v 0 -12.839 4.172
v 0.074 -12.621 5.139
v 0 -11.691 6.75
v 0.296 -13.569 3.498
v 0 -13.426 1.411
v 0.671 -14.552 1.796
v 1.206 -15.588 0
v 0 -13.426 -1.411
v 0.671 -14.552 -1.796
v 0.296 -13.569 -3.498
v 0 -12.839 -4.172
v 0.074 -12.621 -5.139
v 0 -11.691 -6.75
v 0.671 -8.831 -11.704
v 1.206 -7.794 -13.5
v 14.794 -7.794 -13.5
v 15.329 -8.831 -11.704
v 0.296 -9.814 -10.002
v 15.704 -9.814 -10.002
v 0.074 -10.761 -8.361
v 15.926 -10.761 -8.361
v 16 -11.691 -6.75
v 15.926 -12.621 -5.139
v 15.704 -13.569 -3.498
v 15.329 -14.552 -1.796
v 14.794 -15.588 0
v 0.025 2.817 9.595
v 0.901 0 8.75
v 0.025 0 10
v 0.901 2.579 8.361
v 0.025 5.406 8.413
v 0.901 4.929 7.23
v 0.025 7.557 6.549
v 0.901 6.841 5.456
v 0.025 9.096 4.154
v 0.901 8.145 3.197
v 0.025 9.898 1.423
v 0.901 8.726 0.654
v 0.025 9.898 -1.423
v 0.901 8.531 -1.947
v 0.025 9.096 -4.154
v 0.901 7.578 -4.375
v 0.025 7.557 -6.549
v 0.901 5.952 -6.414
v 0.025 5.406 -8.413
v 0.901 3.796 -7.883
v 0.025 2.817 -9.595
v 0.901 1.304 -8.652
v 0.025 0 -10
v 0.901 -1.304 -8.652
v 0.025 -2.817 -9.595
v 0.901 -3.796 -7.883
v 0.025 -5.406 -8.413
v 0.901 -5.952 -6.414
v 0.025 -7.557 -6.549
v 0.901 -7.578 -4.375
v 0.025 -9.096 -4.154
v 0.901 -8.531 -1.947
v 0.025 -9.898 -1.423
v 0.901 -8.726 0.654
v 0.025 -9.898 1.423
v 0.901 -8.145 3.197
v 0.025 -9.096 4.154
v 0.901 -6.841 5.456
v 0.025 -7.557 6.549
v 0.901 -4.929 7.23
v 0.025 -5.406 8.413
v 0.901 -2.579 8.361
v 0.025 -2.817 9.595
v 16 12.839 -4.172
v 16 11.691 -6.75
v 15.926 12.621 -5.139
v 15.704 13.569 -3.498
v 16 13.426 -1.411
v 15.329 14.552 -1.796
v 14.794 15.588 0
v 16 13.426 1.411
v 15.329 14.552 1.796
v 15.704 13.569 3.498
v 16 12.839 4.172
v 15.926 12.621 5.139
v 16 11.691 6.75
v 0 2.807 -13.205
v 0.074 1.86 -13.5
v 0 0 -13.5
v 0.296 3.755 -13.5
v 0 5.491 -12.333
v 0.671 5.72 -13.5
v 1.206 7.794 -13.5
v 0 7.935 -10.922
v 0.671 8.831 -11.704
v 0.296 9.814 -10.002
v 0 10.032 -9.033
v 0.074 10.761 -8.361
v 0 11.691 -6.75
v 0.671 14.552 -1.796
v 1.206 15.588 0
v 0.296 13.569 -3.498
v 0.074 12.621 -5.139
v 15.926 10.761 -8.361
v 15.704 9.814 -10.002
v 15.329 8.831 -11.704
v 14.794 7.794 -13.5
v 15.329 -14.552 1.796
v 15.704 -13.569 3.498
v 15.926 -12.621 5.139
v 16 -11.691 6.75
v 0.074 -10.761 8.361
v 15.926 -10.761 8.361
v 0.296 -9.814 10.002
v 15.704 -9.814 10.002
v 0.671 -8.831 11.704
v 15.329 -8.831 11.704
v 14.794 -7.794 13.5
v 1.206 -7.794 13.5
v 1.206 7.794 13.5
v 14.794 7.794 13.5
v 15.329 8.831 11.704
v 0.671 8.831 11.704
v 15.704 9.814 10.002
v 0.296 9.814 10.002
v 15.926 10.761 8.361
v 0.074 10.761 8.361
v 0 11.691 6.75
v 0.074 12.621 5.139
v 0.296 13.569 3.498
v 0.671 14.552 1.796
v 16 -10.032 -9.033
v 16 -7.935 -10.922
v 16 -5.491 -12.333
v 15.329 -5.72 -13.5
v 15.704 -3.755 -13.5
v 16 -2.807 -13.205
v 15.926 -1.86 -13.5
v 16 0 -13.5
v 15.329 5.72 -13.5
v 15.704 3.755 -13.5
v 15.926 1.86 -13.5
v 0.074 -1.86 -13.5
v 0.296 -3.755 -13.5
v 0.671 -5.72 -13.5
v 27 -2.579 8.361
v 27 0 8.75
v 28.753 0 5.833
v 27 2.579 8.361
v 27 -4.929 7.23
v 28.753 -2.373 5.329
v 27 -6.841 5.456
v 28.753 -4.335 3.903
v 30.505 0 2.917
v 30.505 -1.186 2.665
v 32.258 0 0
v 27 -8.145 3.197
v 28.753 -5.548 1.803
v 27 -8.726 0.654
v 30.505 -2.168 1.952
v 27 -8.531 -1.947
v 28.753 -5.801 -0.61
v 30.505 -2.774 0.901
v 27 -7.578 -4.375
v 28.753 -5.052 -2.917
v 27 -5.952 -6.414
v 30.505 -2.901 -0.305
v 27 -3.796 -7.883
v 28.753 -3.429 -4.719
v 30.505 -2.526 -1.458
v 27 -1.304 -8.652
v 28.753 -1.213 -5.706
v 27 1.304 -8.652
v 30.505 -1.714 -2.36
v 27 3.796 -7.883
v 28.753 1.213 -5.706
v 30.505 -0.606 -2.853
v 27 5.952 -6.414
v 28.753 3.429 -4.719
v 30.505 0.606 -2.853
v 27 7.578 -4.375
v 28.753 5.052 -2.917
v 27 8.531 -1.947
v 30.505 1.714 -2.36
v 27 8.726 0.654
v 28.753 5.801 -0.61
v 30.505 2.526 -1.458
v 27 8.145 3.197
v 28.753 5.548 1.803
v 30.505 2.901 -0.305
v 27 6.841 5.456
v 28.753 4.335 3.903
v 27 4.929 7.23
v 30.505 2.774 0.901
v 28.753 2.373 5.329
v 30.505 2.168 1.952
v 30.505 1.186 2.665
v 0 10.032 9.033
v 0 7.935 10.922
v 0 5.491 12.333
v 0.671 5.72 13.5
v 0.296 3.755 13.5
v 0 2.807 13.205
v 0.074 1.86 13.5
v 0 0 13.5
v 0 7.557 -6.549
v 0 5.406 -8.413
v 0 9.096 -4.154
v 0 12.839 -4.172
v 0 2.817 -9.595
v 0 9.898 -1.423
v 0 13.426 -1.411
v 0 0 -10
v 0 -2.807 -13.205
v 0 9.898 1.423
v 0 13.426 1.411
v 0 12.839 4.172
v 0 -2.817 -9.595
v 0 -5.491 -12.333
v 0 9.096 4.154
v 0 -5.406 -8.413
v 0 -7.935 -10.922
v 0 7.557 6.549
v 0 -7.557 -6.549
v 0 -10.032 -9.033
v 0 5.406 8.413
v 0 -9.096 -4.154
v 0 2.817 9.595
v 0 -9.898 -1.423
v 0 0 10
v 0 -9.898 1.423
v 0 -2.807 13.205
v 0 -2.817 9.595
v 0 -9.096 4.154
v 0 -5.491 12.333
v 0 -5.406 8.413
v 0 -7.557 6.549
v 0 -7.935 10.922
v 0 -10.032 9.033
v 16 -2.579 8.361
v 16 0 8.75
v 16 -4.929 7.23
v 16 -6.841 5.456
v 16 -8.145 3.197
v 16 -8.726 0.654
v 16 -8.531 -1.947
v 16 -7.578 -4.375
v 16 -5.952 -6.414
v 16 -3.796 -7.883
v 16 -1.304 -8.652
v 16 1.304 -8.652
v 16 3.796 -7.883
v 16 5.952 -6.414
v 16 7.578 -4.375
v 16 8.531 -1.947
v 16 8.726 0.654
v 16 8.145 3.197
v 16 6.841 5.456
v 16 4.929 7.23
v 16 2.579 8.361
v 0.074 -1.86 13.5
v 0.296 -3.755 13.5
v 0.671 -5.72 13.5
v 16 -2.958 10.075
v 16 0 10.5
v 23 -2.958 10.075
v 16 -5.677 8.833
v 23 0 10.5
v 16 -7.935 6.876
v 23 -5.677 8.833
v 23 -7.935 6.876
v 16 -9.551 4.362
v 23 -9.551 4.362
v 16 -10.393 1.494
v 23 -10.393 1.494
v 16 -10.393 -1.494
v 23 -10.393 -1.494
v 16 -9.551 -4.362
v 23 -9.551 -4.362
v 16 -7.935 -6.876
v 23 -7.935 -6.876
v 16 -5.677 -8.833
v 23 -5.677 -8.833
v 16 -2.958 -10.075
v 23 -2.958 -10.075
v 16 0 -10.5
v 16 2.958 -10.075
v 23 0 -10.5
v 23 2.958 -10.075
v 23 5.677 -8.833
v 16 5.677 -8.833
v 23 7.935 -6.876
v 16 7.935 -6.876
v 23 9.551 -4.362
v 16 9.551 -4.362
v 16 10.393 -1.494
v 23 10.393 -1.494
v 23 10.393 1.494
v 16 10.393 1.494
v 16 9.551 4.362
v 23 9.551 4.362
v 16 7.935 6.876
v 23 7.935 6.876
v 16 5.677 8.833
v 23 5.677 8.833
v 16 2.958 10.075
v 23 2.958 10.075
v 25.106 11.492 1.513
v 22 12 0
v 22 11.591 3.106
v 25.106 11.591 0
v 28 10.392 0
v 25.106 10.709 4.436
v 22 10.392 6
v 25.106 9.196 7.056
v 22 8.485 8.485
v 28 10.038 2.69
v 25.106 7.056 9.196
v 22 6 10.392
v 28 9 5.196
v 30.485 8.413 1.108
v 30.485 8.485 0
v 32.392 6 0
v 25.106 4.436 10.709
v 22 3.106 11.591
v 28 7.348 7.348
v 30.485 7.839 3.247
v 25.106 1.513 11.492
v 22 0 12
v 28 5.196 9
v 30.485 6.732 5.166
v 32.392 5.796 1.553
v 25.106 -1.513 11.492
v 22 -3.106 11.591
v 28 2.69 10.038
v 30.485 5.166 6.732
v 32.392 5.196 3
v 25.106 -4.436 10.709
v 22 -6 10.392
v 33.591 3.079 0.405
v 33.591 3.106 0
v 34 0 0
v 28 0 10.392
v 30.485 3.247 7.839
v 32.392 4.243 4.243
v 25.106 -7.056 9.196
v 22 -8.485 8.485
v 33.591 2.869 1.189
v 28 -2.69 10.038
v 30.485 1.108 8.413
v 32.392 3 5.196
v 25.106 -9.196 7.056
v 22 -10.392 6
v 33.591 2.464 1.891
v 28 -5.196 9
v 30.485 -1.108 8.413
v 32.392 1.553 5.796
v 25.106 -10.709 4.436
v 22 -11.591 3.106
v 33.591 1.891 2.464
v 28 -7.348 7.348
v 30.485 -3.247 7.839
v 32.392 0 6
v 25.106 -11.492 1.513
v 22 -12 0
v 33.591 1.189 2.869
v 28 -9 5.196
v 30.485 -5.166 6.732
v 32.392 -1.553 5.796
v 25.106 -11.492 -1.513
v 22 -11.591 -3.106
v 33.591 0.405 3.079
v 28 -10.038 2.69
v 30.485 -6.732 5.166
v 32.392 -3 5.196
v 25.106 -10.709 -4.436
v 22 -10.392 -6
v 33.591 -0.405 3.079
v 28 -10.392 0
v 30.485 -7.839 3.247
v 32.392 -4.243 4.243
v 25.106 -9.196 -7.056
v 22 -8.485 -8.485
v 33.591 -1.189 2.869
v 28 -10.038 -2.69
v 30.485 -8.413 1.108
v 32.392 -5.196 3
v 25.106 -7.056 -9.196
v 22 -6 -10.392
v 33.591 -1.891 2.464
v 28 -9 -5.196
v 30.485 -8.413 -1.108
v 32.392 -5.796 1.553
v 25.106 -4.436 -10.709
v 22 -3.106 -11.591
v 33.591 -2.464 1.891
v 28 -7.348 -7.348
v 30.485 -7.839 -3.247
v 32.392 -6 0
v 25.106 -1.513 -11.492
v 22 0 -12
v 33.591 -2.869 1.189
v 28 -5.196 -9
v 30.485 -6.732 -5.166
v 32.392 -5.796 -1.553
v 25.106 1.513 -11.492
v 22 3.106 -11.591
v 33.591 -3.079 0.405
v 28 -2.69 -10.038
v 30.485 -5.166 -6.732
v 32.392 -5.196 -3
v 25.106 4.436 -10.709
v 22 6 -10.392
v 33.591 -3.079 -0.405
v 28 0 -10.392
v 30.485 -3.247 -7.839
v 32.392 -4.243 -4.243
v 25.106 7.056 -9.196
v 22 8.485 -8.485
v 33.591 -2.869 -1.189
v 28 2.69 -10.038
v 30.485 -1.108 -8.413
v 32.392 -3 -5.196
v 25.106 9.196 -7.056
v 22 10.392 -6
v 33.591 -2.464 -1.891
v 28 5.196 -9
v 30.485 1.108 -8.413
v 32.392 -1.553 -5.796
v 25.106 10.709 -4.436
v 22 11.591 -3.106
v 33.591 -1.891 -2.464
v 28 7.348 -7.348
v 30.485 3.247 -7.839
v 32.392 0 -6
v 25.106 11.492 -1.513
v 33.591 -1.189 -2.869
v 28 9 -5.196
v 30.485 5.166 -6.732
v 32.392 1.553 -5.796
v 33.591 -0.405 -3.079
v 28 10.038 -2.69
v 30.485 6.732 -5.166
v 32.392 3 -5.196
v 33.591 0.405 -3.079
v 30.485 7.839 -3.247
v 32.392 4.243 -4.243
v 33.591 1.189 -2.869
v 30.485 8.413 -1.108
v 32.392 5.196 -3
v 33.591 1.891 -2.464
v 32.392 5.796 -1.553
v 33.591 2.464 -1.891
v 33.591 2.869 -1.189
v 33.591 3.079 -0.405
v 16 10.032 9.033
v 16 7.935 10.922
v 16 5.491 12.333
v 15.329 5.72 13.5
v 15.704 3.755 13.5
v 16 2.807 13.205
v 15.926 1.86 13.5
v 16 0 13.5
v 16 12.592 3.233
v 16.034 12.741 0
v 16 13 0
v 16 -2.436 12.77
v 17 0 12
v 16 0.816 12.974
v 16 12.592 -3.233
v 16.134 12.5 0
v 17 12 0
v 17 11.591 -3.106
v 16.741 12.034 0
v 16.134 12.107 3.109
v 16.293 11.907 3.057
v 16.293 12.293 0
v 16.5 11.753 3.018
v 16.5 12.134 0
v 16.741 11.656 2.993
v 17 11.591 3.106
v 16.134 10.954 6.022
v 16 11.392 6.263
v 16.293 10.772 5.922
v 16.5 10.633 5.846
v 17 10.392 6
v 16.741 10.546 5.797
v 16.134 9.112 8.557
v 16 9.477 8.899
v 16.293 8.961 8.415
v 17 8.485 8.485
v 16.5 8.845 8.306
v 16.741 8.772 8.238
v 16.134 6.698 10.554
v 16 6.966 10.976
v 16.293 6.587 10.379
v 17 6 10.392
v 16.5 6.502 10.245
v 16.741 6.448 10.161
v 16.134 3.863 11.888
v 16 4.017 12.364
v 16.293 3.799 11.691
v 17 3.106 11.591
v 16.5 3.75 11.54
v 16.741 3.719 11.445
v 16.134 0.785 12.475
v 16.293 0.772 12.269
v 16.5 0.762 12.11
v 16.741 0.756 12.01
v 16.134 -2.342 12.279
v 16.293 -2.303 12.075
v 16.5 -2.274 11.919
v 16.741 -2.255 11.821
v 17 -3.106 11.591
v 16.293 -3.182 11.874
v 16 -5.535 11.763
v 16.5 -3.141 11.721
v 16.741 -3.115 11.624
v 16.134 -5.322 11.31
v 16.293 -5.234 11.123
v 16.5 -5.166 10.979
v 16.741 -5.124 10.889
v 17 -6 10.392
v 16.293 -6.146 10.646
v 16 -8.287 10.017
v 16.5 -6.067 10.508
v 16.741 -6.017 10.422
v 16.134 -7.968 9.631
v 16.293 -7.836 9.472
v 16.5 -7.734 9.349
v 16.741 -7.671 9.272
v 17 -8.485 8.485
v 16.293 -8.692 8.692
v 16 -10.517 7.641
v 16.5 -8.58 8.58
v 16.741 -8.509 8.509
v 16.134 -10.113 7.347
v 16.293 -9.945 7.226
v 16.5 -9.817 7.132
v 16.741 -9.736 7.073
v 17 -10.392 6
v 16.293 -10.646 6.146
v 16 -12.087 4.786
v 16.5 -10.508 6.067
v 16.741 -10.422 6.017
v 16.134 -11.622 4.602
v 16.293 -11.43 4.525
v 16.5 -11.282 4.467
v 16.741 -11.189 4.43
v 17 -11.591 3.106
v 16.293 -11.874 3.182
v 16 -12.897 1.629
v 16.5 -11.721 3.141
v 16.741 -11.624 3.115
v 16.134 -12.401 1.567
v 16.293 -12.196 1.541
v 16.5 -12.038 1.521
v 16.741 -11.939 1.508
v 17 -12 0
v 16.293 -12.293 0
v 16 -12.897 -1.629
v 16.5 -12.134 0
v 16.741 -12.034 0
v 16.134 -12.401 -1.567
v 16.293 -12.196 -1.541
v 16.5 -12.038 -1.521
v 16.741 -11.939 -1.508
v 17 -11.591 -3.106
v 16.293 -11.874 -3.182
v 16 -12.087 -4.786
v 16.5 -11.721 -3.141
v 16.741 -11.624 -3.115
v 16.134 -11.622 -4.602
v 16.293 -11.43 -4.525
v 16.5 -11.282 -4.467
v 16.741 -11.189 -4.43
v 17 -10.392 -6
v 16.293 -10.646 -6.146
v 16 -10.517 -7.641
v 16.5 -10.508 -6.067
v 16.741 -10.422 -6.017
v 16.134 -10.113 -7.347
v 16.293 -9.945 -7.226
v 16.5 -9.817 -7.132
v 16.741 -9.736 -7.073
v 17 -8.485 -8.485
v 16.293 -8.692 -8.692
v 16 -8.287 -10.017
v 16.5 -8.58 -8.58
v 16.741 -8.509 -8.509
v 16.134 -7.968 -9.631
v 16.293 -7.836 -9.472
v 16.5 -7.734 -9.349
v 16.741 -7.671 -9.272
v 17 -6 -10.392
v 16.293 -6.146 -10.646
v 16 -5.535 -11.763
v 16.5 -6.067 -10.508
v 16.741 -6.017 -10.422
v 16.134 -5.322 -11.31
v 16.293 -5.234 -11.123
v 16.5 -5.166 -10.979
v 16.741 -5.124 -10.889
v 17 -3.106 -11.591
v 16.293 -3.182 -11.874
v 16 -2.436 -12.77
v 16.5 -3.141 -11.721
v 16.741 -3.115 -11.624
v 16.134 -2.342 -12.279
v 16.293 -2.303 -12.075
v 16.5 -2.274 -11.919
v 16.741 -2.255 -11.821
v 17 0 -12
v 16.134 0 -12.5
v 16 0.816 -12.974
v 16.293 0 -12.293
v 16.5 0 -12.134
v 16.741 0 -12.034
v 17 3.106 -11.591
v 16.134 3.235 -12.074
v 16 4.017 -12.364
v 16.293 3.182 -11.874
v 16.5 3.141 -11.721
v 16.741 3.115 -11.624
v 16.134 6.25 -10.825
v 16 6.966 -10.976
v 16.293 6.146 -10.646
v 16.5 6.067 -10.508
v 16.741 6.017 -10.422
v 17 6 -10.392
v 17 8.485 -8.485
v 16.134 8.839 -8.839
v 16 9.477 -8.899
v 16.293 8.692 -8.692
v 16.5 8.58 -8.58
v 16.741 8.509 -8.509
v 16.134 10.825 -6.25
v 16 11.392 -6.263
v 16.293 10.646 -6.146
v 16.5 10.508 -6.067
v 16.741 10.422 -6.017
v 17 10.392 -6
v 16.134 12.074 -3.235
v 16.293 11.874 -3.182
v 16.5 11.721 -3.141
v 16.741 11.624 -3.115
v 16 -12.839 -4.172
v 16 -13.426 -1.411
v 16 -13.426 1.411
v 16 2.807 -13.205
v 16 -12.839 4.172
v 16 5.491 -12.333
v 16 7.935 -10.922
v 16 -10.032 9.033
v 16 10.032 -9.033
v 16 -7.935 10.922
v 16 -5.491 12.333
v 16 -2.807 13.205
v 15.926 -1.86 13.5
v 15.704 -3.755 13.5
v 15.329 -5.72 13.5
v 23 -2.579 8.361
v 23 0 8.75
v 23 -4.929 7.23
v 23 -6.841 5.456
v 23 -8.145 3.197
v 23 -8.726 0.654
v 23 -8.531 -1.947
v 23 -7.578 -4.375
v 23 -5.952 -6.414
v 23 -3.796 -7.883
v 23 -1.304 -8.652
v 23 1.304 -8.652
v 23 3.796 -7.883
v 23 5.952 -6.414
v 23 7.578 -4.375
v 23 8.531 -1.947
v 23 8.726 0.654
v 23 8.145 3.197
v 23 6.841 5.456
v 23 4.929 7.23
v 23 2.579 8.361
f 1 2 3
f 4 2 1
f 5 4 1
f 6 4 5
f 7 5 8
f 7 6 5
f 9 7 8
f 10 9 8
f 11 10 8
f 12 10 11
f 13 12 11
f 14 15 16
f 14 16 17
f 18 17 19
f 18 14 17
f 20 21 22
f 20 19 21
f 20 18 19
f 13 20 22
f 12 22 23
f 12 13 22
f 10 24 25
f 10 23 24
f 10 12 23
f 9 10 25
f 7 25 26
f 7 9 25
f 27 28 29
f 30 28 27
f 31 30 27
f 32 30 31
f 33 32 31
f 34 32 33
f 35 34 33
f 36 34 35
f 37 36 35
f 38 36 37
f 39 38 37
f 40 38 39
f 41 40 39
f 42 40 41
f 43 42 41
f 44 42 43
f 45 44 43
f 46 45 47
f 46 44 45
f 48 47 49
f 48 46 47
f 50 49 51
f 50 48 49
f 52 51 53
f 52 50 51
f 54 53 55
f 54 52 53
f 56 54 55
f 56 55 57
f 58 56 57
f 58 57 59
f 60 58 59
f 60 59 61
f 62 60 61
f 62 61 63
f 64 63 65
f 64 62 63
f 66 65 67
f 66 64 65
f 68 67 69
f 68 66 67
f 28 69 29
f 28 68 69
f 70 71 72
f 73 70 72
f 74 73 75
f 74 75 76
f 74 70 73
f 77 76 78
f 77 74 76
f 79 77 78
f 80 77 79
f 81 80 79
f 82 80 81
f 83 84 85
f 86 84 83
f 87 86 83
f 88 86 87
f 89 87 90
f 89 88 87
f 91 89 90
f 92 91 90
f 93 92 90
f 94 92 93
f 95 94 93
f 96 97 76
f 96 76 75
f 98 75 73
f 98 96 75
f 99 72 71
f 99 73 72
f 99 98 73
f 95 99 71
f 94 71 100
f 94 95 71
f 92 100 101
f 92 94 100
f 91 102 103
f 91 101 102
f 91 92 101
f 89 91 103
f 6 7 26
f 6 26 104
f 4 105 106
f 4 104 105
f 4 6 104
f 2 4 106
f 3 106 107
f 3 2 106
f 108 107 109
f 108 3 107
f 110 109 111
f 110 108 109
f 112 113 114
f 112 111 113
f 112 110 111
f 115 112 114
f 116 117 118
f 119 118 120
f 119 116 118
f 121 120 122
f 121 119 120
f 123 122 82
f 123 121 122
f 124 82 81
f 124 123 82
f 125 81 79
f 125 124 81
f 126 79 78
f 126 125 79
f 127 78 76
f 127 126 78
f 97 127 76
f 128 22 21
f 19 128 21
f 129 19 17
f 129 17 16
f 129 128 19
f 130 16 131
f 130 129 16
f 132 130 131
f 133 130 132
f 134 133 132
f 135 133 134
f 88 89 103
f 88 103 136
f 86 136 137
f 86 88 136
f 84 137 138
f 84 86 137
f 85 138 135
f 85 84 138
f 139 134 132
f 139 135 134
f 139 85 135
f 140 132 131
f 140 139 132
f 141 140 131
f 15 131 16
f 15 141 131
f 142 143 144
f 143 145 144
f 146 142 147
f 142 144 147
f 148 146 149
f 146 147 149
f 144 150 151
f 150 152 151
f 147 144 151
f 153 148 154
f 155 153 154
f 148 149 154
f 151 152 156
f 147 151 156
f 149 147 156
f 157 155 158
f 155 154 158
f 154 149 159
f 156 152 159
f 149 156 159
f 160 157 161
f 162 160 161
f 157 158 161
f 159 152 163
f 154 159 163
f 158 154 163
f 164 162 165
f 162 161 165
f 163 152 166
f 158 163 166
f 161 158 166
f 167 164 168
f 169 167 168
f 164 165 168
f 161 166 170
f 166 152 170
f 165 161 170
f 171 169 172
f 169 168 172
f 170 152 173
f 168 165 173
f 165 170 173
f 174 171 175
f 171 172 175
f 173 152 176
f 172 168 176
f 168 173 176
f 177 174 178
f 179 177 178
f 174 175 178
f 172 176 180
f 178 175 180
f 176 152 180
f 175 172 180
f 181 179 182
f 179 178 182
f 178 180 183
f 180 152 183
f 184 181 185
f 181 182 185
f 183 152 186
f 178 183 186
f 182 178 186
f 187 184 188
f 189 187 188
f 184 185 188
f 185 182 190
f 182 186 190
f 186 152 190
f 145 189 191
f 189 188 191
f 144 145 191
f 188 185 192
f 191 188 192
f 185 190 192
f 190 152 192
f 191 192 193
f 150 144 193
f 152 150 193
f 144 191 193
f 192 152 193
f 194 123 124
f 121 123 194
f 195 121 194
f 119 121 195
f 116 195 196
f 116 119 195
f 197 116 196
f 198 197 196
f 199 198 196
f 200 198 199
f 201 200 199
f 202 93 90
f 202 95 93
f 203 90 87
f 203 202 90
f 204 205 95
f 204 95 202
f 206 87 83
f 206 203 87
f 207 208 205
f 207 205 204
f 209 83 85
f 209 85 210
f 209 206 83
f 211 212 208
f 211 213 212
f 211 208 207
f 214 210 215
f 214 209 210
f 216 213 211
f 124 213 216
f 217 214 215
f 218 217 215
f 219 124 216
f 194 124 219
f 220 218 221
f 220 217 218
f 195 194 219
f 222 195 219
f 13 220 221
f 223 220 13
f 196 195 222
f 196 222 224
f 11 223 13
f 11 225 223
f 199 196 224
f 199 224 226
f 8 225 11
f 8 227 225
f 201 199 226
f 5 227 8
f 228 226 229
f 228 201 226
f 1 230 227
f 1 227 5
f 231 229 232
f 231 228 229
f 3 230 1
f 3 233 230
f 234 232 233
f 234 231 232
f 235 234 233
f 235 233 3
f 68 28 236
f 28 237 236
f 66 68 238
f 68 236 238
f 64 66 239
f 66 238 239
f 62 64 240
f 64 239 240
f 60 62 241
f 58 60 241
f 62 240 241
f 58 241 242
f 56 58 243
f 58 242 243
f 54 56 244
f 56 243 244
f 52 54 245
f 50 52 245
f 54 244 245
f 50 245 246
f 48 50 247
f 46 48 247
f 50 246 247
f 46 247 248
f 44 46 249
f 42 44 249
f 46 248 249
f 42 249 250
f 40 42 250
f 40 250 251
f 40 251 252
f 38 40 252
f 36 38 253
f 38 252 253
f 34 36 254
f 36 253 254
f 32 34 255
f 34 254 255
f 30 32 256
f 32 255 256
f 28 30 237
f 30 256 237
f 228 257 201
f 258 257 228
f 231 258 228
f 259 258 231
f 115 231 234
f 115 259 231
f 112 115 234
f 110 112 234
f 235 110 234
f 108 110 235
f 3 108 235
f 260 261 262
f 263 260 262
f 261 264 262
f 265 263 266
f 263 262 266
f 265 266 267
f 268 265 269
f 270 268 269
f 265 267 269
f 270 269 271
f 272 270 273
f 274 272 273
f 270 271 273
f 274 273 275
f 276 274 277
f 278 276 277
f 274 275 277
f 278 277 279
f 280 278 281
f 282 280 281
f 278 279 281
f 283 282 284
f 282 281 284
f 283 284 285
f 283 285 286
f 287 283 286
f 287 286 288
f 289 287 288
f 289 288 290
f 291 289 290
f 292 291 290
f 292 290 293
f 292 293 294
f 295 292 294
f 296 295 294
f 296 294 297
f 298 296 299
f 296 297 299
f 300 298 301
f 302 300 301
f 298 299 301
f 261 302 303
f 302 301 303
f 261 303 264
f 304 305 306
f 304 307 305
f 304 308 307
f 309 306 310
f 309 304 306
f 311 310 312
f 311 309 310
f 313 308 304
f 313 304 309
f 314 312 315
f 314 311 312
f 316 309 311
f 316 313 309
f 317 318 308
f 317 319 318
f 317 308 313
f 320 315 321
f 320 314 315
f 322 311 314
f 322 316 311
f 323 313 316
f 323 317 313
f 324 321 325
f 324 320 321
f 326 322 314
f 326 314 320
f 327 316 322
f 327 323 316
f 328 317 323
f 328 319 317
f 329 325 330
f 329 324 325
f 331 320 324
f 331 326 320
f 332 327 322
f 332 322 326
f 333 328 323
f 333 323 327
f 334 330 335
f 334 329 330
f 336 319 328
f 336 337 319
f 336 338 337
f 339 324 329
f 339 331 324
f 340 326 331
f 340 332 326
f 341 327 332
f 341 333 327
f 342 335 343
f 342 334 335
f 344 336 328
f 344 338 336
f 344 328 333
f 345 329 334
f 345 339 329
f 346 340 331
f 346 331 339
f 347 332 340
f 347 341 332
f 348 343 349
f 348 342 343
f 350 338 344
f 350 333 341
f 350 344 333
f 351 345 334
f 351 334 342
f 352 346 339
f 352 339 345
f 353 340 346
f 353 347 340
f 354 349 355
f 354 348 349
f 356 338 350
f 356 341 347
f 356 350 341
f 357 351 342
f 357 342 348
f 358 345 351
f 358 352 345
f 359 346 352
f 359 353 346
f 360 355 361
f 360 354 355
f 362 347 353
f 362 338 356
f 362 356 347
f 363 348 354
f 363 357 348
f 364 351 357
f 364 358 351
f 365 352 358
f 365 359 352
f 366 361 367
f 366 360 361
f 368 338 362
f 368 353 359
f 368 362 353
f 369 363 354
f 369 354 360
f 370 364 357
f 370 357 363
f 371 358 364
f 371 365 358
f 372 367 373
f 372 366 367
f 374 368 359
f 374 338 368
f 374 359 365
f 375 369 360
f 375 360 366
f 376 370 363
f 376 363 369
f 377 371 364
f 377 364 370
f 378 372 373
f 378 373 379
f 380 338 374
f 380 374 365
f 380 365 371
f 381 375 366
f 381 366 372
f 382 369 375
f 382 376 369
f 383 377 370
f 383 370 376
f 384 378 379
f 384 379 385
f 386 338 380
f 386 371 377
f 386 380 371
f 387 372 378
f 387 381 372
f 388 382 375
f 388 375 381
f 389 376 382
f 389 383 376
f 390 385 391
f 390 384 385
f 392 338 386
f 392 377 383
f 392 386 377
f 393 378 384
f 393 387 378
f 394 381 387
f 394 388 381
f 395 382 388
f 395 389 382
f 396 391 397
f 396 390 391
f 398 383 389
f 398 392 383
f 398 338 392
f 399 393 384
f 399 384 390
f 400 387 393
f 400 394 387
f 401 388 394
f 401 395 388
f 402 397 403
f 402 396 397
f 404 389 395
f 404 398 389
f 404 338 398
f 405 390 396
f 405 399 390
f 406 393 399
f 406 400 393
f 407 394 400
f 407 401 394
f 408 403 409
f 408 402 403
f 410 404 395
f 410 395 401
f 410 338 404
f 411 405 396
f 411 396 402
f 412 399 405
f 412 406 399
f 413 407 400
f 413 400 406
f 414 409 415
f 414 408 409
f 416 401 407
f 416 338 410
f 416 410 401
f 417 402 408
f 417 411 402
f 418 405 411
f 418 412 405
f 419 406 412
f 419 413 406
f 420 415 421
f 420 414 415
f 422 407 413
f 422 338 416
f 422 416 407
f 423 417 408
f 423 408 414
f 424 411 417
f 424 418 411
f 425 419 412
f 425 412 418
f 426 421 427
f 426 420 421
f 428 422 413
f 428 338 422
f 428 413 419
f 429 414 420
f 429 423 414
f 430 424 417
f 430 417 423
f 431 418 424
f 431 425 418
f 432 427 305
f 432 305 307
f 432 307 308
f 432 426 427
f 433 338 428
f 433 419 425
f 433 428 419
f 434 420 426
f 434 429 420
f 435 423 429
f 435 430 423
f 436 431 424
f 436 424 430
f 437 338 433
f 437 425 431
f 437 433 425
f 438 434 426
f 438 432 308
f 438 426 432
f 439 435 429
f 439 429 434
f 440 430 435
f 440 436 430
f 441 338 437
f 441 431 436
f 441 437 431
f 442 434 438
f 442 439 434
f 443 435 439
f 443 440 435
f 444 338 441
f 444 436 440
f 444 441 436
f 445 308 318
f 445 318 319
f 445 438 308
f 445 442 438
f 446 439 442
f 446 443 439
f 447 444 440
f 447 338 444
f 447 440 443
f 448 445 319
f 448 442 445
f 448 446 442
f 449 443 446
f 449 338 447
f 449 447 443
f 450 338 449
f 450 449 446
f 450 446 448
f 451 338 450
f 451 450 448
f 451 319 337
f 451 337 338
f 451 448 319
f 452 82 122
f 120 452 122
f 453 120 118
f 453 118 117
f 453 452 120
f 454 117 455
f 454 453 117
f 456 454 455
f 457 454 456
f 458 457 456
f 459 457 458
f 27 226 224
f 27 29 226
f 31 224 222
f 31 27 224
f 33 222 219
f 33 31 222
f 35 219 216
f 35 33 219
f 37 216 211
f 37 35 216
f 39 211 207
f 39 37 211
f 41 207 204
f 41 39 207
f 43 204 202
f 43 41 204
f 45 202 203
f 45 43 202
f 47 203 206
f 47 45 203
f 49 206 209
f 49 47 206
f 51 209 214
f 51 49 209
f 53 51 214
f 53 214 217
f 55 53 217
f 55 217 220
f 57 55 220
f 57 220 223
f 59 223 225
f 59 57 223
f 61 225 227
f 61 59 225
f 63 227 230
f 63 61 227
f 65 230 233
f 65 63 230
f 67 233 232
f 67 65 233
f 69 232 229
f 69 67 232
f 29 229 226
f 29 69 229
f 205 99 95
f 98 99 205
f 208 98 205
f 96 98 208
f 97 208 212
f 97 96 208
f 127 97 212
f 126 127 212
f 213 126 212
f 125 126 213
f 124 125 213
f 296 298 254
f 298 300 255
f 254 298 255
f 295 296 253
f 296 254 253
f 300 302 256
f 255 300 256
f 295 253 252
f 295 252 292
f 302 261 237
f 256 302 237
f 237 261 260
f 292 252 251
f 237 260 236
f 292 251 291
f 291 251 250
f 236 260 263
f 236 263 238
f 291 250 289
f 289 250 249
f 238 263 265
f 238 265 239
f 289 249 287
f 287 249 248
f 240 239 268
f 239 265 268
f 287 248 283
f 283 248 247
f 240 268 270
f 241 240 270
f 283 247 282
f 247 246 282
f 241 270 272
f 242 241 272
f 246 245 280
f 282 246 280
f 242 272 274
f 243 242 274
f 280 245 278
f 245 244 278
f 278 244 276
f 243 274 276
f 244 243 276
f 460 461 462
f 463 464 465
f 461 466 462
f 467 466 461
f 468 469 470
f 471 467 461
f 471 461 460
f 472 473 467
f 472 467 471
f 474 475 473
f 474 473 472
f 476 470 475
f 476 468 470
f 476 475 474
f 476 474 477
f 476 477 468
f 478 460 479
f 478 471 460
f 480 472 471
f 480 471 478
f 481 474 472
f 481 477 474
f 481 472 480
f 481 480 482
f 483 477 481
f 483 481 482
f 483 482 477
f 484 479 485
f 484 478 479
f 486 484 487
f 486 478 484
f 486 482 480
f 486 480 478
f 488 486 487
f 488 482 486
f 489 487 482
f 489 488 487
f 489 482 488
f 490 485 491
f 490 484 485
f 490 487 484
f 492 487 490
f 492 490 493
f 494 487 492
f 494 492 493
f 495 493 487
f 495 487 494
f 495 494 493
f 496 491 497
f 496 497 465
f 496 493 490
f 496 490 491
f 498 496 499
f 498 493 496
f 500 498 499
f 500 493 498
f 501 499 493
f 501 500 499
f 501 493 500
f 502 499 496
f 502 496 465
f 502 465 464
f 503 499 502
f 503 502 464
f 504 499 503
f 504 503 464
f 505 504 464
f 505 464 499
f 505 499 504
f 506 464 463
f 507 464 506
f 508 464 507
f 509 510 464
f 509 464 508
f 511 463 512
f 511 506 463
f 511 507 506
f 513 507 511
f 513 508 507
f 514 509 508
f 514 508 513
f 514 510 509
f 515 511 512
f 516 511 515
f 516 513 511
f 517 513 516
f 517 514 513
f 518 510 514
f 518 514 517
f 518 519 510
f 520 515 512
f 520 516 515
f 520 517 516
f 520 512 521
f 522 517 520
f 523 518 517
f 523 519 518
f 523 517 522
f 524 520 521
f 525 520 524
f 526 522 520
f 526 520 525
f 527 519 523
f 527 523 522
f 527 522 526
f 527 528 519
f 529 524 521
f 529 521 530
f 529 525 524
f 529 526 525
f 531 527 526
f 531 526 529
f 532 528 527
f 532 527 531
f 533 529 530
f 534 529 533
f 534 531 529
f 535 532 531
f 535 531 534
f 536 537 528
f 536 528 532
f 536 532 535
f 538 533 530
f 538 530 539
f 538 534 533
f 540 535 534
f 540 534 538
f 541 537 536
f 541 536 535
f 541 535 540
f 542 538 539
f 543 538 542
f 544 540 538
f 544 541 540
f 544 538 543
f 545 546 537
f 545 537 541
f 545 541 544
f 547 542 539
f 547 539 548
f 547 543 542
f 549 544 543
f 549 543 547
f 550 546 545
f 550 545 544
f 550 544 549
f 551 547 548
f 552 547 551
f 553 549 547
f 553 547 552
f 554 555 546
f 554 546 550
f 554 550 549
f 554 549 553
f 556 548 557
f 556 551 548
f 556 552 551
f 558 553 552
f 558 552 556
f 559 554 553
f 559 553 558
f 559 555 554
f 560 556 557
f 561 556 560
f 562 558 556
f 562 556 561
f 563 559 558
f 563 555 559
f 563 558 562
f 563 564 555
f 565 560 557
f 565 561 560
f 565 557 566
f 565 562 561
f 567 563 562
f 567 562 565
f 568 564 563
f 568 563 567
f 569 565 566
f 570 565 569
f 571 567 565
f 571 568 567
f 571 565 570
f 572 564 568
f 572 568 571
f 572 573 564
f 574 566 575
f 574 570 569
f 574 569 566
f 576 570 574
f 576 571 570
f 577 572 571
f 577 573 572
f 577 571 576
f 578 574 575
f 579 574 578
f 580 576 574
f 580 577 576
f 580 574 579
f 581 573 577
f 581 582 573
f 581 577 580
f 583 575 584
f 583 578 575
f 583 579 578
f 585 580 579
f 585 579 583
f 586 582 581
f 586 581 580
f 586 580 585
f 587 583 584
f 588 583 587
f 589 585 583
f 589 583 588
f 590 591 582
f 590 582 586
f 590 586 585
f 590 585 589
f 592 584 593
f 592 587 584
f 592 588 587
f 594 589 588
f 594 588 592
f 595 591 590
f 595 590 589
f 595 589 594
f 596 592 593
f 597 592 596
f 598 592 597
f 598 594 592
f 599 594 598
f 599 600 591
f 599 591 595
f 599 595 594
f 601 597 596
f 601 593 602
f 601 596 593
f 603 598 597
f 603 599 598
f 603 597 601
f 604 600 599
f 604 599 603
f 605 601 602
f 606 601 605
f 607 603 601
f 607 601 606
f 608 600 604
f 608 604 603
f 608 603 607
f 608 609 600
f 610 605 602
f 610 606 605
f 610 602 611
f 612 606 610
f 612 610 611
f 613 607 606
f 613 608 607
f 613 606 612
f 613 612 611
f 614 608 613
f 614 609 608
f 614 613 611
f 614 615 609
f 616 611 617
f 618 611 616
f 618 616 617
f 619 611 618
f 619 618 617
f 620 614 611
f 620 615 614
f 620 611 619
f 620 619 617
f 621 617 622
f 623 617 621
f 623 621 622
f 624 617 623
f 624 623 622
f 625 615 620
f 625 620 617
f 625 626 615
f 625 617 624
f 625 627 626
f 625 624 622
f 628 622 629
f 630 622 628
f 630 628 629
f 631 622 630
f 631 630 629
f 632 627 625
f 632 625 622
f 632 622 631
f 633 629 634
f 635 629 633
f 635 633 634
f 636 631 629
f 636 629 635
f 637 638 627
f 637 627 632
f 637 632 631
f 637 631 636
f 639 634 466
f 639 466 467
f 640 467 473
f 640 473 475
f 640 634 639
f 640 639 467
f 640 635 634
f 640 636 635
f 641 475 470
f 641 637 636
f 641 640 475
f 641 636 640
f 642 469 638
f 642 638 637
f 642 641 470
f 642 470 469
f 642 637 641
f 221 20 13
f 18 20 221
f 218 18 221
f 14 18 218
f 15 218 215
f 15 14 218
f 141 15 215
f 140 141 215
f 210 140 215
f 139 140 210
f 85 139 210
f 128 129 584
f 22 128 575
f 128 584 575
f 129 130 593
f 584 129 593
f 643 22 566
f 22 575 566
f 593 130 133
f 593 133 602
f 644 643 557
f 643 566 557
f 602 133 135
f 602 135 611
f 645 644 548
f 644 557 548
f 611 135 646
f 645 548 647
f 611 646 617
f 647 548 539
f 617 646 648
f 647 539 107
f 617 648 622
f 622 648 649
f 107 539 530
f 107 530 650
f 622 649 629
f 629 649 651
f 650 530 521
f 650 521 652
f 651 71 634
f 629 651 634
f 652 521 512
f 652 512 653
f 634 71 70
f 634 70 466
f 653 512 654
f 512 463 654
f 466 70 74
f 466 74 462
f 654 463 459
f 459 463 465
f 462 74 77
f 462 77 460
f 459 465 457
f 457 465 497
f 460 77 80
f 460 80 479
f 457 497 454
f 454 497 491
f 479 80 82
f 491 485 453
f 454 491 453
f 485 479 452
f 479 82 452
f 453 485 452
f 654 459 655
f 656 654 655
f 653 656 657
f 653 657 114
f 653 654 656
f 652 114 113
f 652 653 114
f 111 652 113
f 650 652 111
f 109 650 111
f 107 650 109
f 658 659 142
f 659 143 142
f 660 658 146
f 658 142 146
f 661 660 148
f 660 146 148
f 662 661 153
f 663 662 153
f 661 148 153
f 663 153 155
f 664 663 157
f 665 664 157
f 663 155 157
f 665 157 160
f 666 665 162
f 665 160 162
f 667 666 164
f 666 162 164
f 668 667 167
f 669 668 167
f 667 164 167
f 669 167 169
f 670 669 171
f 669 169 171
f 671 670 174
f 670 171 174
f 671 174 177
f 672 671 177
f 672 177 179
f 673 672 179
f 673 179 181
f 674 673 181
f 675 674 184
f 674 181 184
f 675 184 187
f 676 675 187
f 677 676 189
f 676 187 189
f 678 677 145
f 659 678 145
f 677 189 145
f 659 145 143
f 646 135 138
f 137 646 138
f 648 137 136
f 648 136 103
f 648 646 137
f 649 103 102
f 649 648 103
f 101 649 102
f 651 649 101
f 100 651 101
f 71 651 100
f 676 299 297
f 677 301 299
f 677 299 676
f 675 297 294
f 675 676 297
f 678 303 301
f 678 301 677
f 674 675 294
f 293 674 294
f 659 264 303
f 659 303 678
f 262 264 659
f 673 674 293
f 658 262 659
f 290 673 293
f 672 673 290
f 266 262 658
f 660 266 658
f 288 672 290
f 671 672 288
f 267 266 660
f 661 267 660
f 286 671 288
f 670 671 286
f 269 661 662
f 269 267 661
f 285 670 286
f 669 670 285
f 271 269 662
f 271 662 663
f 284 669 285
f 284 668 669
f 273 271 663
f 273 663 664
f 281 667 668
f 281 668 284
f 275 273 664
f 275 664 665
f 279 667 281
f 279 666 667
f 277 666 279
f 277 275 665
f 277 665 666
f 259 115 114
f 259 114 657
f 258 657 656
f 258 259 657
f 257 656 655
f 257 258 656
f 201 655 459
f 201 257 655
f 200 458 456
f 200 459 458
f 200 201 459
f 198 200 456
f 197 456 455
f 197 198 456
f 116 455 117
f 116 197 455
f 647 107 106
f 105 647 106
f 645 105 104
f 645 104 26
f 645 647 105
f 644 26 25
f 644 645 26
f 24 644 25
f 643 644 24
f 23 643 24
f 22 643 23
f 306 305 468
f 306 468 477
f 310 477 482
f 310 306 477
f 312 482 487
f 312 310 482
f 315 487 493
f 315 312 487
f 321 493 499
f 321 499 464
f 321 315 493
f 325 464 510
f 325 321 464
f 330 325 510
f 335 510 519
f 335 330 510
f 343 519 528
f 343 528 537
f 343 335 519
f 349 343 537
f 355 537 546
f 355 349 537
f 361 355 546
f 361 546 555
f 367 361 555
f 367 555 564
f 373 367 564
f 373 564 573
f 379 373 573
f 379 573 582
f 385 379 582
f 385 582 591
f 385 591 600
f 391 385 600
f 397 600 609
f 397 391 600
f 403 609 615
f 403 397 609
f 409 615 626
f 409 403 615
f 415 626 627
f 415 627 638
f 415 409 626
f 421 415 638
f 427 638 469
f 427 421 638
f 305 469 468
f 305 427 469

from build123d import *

# Parameters (mm, degrees)
BASENUT_DEPTH = 16
GRVSKE_W      = 7
GRVSKE_H      = 2.75
DOMEFILLET_R  = 1


with BuildPart() as part:
    # BaseNutSke → BaseNut (new body)
    with BuildSketch(Plane(origin=(0, 0, 0), x_dir=(0, 0, -1), z_dir=(1, 0, 0))):
        Polygon((13.5, 7.794228634), (13.5, -7.794228634), (0, -15.588457268), (-13.5, -7.794228634), (-13.5, 7.794228634), (0, 15.588457268), align=None)
    extrude(amount=BASENUT_DEPTH)

    # DomeSke → Dome (revolve)
    with BuildSketch(Plane.XY):
        with BuildLine():
            Line((34, 0), (0, 0))
            Line((0, 0), (0, 12))
            Line((0, 12), (22, 12))
            ThreePointArc((22, 12), (30.485281374, 8.485281374), (34, 0))
        make_face()
    revolve(axis=Axis((0, 0, 0), (1, 0, 0)))

    # Sketch4 → DoubleChamfer (revolve, cut)
    with BuildSketch(Plane.XY, mode=Mode.PRIVATE) as doublechamfer_sk:
        Polygon((0, 13.5), (2.504809472, 17.838457268), (13.495190528, 17.838457268), (16, 13.5), (18, 13.5), (18, 28.5), (-2, 28.5), (-2, 13.5), align=None)
    revolve(doublechamfer_sk.sketch.rotate(Axis((0, 0, 0), (1, 0, 0)), 90), axis=Axis((0, 0, 0), (1, 0, 0)), mode=Mode.SUBTRACT)

    # TapDriSke → TapDrill (revolve, cut)
    with BuildSketch(Plane.XY, mode=Mode.PRIVATE) as tapdrill_sk:
        Polygon((0, 8.75), (27, 8.75), (32.257530416, 0), (0, 0), align=None)
    revolve(tapdrill_sk.sketch.rotate(Axis((0, 0, 0), (1, 0, 0)), 90), axis=Axis((0, 0, 0), (1, 0, 0)), mode=Mode.SUBTRACT)

    # GrvSke → Groove (revolve, cut)
    with BuildSketch(Plane.XY, mode=Mode.PRIVATE) as groove_sk:
        with Locations((19.5, 9.125)):
            Rectangle(GRVSKE_W, GRVSKE_H)
    revolve(groove_sk.sketch.rotate(Axis((0, 0, 0), (1, 0, 0)), 90), axis=Axis((0, 0, 0), (1, 0, 0)), mode=Mode.SUBTRACT)

    # EndChamferSketch → EndChamfer (revolve, cut)
    with BuildSketch(Plane.XY, mode=Mode.PRIVATE) as endchamfer_sk:
        Polygon((-0.0254, 10), (0.0254, 10), (0.988185365, 8.625), (-0.0254, 8.625), align=None)
    revolve(endchamfer_sk.sketch.rotate(Axis((0, 0, 0), (-1, 0, 0)), 270), axis=Axis((0, 0, 0), (-1, 0, 0)), mode=Mode.SUBTRACT)

    # DomeFillet
    domefillet_edges = [part.edges().sort_by_distance(p)[0] for p in [
        (16, -12, 0),
    ]]
    fillet(domefillet_edges, radius=DOMEFILLET_R)


solid = part.part
